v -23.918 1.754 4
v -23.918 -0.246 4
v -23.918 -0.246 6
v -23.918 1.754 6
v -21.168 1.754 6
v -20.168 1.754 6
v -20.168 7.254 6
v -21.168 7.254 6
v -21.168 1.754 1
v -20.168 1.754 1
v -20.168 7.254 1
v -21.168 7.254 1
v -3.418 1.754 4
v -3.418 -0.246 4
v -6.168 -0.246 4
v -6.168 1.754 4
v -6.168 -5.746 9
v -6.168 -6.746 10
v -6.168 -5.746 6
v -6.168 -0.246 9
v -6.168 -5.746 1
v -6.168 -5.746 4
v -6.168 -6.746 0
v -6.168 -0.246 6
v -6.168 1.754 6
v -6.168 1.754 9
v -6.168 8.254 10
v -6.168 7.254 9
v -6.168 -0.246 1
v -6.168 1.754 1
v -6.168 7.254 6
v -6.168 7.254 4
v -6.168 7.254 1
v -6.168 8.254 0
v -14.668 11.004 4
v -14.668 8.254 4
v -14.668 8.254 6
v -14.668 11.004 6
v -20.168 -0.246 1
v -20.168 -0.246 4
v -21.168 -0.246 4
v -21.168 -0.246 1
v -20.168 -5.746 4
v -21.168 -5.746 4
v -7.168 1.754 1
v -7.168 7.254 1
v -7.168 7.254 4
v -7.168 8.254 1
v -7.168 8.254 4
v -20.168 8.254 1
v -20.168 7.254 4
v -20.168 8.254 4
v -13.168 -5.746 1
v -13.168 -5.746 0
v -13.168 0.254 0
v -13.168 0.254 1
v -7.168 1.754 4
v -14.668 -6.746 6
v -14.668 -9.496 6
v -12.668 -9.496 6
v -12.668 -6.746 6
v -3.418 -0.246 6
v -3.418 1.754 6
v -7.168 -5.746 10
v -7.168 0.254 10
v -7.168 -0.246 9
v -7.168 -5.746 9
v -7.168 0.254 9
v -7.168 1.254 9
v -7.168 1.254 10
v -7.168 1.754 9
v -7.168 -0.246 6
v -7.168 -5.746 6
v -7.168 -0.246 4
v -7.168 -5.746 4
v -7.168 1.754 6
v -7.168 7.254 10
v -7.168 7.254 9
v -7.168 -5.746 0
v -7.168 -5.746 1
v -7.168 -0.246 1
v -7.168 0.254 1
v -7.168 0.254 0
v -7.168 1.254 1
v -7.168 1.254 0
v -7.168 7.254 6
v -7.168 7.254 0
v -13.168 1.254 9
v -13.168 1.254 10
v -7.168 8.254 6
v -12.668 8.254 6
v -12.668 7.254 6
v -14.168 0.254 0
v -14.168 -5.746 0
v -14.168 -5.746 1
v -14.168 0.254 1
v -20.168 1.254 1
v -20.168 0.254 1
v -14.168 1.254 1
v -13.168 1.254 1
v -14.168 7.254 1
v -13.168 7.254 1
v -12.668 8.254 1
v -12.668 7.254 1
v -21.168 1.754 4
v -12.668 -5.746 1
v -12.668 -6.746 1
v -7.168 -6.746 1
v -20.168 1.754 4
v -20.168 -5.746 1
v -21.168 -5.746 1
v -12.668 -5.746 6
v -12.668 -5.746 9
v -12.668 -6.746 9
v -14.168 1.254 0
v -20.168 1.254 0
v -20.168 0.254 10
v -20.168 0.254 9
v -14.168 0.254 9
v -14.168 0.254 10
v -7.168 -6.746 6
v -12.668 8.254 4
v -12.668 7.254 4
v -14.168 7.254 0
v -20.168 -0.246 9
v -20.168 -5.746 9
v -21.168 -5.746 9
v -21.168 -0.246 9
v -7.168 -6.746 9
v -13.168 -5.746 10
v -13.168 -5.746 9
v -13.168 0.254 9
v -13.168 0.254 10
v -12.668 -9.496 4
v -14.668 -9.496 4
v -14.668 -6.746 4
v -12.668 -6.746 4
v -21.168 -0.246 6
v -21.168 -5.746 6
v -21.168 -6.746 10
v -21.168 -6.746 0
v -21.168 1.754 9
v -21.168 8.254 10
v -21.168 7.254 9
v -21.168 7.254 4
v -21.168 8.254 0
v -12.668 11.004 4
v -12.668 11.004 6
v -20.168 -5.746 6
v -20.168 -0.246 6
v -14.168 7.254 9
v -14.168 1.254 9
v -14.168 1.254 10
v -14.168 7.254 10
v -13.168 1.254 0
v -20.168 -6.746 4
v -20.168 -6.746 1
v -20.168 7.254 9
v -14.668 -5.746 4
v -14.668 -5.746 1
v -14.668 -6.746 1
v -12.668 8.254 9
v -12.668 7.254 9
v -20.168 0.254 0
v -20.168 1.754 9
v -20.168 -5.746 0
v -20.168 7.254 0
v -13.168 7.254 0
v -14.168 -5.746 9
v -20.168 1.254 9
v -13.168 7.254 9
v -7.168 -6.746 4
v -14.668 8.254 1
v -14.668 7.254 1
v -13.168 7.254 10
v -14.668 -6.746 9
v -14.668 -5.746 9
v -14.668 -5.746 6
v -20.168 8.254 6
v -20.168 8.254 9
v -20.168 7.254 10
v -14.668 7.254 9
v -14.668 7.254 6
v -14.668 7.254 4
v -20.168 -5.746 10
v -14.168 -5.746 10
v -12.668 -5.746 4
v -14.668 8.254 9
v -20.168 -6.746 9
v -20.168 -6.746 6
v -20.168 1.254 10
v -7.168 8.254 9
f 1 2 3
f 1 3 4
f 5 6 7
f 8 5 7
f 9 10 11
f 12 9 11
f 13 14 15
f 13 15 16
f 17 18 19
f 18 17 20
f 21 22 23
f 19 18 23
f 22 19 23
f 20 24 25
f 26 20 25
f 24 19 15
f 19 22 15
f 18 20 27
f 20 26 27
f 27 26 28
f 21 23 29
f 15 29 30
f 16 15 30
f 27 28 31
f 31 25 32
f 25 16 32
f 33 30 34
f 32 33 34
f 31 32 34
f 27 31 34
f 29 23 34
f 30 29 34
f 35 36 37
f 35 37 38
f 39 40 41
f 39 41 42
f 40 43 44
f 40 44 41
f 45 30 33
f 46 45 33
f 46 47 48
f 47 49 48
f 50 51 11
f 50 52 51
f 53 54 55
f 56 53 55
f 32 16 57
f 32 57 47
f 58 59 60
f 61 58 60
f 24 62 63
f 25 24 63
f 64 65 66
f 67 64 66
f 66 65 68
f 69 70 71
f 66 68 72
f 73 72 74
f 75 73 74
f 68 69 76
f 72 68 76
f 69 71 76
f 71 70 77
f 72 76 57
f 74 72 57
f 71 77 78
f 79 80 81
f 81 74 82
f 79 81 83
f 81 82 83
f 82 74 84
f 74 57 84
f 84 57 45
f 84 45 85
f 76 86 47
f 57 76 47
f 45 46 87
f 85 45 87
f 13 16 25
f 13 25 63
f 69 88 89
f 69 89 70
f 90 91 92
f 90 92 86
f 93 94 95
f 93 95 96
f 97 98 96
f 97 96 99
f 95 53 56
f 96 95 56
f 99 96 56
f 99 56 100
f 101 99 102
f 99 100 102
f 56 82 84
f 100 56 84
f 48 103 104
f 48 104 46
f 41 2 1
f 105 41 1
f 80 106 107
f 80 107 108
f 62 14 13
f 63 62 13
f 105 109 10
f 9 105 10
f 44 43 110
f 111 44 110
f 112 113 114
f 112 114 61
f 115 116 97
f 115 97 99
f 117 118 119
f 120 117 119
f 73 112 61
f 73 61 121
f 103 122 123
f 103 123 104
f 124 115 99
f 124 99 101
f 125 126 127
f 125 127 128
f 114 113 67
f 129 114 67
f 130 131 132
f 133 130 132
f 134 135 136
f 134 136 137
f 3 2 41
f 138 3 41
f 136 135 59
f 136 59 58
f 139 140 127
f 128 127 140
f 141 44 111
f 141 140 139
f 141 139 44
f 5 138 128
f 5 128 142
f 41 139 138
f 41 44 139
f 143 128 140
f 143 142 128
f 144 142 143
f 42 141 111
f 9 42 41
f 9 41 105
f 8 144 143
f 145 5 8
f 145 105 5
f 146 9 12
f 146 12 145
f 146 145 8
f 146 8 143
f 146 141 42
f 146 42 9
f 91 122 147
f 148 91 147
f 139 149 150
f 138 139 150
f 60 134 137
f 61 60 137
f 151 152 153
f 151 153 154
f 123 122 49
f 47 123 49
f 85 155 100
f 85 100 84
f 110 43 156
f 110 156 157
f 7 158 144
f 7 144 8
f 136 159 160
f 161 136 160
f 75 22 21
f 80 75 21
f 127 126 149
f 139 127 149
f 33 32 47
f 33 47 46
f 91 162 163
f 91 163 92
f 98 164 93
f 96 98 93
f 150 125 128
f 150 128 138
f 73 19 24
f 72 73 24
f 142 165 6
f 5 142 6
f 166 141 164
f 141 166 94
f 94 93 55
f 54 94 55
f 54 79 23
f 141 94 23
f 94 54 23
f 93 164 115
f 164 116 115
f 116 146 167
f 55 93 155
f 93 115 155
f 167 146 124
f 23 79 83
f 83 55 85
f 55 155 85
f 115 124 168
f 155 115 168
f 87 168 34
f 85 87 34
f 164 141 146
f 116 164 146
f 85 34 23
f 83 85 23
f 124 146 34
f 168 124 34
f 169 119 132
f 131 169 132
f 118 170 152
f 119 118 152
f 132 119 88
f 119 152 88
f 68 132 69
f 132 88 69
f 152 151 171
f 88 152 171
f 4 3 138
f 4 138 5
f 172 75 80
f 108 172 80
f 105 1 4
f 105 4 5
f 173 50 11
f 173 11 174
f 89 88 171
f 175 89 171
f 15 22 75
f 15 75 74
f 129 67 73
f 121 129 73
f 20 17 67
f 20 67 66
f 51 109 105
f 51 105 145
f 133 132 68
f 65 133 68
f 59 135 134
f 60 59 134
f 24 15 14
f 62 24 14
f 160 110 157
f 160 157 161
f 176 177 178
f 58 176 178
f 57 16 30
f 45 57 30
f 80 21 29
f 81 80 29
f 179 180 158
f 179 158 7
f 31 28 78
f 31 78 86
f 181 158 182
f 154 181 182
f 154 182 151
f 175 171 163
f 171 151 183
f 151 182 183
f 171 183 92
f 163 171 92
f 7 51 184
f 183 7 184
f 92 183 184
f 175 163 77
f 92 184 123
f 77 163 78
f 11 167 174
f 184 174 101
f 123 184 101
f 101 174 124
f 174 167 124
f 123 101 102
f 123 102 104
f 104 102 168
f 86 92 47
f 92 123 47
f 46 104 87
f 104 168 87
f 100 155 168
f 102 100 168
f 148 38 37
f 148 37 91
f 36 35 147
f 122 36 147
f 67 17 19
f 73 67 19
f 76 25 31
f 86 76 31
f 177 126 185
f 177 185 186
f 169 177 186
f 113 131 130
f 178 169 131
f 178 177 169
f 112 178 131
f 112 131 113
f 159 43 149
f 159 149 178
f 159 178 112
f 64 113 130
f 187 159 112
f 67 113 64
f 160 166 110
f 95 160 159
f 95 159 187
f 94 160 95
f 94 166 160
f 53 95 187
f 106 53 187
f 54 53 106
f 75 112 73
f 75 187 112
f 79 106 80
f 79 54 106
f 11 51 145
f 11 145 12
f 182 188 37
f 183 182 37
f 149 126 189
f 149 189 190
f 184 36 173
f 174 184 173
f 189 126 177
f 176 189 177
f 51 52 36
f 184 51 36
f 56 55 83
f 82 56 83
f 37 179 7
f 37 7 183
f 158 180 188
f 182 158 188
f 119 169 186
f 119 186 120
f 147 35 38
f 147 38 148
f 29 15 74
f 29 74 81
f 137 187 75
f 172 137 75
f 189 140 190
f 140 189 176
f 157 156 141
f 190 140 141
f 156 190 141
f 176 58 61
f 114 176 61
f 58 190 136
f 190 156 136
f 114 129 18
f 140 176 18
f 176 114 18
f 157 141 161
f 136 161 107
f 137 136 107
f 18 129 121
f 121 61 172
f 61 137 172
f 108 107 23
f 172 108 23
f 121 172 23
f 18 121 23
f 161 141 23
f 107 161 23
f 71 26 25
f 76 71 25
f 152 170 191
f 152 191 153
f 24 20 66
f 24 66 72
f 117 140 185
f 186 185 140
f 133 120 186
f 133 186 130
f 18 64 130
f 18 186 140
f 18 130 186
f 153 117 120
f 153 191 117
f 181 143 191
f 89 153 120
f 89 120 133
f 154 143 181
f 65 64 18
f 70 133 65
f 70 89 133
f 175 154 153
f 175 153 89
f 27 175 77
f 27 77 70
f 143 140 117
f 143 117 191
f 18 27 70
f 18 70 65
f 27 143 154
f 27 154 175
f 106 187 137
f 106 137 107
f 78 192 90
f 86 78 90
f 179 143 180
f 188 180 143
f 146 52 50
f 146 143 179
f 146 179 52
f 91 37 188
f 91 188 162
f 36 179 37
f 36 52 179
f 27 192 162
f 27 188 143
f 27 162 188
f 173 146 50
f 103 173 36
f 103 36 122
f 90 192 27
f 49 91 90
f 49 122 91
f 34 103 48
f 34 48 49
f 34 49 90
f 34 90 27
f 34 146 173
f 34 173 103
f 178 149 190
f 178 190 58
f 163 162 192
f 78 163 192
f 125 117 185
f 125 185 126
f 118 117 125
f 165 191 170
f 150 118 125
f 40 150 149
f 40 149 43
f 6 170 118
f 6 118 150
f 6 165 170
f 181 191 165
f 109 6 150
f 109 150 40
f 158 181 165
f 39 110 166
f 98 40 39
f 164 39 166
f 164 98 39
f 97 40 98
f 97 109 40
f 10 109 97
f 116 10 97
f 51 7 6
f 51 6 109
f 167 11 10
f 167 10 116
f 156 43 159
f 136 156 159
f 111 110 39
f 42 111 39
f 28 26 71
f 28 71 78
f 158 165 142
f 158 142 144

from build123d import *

# Parameters (mm, degrees)
SKETCH_1_W               = 15
SKETCH_1_H               = 15
SKETCH_1_W_2             = 6
SKETCH_1_H_2             = 6
SKETCH_1_W_3             = 2
SKETCH_1_H_3             = 2.75
SKETCH_1_W_4             = 2.75
SKETCH_1_H_4             = 2
EXTRUDE_1_DEPTH          = 10
SKETCH_2_W               = 2
SKETCH_2_H               = 4
CUT_EXTRUDE_1_DEPTH      = 2.75
SKETCH_3_W               = 4
SKETCH_3_H               = 2
CUT_EXTRUDE_2_DEPTH      = 2.75
SKETCH_4_W               = 2
SKETCH_4_H               = 4
CUT_EXTRUDE_3_DEPTH      = 2.75
SKETCH_5_W               = 4
SKETCH_5_H               = 2
CUT_EXTRUDE_4_DEPTH      = 2.75
SKETCH_6_W               = 5.5
SKETCH_6_H               = 3
CUT_EXTRUDE_5_DEPTH      = 18.75
SKETCH_7_W               = 3
SKETCH_7_H               = 5.5
CUT_EXTRUDE_6_DEPTH      = 18.75
SKETCH_8_W               = 8
SKETCH_8_H               = 13
CUT_EXTRUDE_7_DEPTH      = 6
CUT_EXTRUDE_7_DEPTH_BACK = 0.75
SKETCH_9_W               = 8
SKETCH_9_H               = 13
CUT_EXTRUDE_8_DEPTH      = 6
SKETCH_10_W              = 8
SKETCH_10_H              = 13
CUT_EXTRUDE_9_DEPTH      = 6


with BuildPart() as part:
    # ｽｹｯﾁ1 → ﾎﾞｽ - 押し出し1 (new body)
    with BuildSketch(Plane.XY):
        with Locations((-13.66786655, 0.754091784)):
            Rectangle(SKETCH_1_W, SKETCH_1_H)
        with Locations((-17.16786655, -2.745908216)):
            Rectangle(SKETCH_1_W_2, SKETCH_1_H_2, mode=Mode.SUBTRACT)
        with Locations((-10.16786655, -2.745908216)):
            Rectangle(SKETCH_1_W_2, SKETCH_1_H_2, mode=Mode.SUBTRACT)
        with Locations((-10.16786655, 4.254091784)):
            Rectangle(SKETCH_1_W_2, SKETCH_1_H_2, mode=Mode.SUBTRACT)
        with Locations((-17.16786655, 4.254091784)):
            Rectangle(SKETCH_1_W_2, SKETCH_1_H_2, mode=Mode.SUBTRACT)
        with Locations((-13.66786655, 9.629091784)):
            Rectangle(SKETCH_1_W_3, SKETCH_1_H_3)
        with Locations((-22.54286655, 0.754091784)):
            Rectangle(SKETCH_1_W_4, SKETCH_1_H_4)
        with Locations((-4.79286655, 0.754091784)):
            Rectangle(SKETCH_1_W_4, SKETCH_1_H_4)
        with Locations((-13.66786655, -8.120908216)):
            Rectangle(SKETCH_1_W_3, SKETCH_1_H_3)
    extrude(amount=EXTRUDE_1_DEPTH)

    # ｽｹｯﾁ2 → ｶｯﾄ - 押し出し1 (cut)
    with BuildSketch(Plane(origin=(0, 11.004091784, 0), x_dir=(1, 0, 0), z_dir=(0, 1, 0))):
        with Locations((-13.66786655, -2)):
            Rectangle(SKETCH_2_W, SKETCH_2_H)
        with Locations((-13.66786655, -8)):
            Rectangle(SKETCH_2_W, SKETCH_2_H)
    extrude(amount=-CUT_EXTRUDE_1_DEPTH, mode=Mode.SUBTRACT)

    # ｽｹｯﾁ3 → ｶｯﾄ - 押し出し2 (cut)
    with BuildSketch(Plane(origin=(-3.41786655, 0, 0), x_dir=(0, 0, -1), z_dir=(1, 0, 0))):
        with Locations((-8, 0.754091784)):
            Rectangle(SKETCH_3_W, SKETCH_3_H)
        with Locations((-2, 0.754091784)):
            Rectangle(SKETCH_3_W, SKETCH_3_H)
    extrude(amount=-CUT_EXTRUDE_2_DEPTH, mode=Mode.SUBTRACT)

    # ｽｹｯﾁ4 → ｶｯﾄ - 押し出し3 (cut)
    with BuildSketch(Plane.XZ.offset(9.495908216)):
        with Locations((-13.66786655, 8)):
            Rectangle(SKETCH_4_W, SKETCH_4_H)
        with Locations((-13.66786655, 2)):
            Rectangle(SKETCH_4_W, SKETCH_4_H)
    extrude(amount=-CUT_EXTRUDE_3_DEPTH, mode=Mode.SUBTRACT)

    # ｽｹｯﾁ5 → ｶｯﾄ - 押し出し4 (cut)
    with BuildSketch(Plane.ZY.offset(23.91786655)):
        with Locations((2, 0.754091784)):
            Rectangle(SKETCH_5_W, SKETCH_5_H)
        with Locations((8, 0.754091784)):
            Rectangle(SKETCH_5_W, SKETCH_5_H)
    extrude(amount=-CUT_EXTRUDE_4_DEPTH, mode=Mode.SUBTRACT)

    # ｽｹｯﾁ6 → ｶｯﾄ - 押し出し5 (cut, through all)
    with BuildSketch(Plane(origin=(0, 8.254091784, 0), x_dir=(1, 0, 0), z_dir=(0, 1, 0))):
        with Locations((-17.41786655, -2.5)):
            Rectangle(SKETCH_6_W, SKETCH_6_H)
        with Locations((-9.91786655, -2.5)):
            Rectangle(SKETCH_6_W, SKETCH_6_H)
        with Locations((-17.41786655, -7.5)):
            Rectangle(SKETCH_6_W, SKETCH_6_H)
        with Locations((-9.91786655, -7.5)):
            Rectangle(SKETCH_6_W, SKETCH_6_H)
    extrude(amount=-CUT_EXTRUDE_5_DEPTH, mode=Mode.SUBTRACT)

    # ｽｹｯﾁ7 → ｶｯﾄ - 押し出し6 (cut, through all)
    with BuildSketch(Plane(origin=(-6.16786655, 0, 0), x_dir=(0, 0, -1), z_dir=(1, 0, 0))):
        with Locations((-7.5, 4.504091784)):
            Rectangle(SKETCH_7_W, SKETCH_7_H)
        with Locations((-2.5, 4.504091784)):
            Rectangle(SKETCH_7_W, SKETCH_7_H)
        with Locations((-7.5, -2.995908216)):
            Rectangle(SKETCH_7_W, SKETCH_7_H)
        with Locations((-2.5, -2.995908216)):
            Rectangle(SKETCH_7_W, SKETCH_7_H)
    extrude(amount=-CUT_EXTRUDE_6_DEPTH, mode=Mode.SUBTRACT)

    # ｽｹｯﾁ8 → ｶｯﾄ - 押し出し7 (cut, two sides)
    with BuildSketch(Plane.ZY.offset(14.16786655)) as cut_extrude_7_sk:
        with Locations((5, 0.754091784)):
            Rectangle(SKETCH_8_W, SKETCH_8_H)
    extrude(amount=CUT_EXTRUDE_7_DEPTH, mode=Mode.SUBTRACT)
    extrude(cut_extrude_7_sk.sketch, amount=-CUT_EXTRUDE_7_DEPTH_BACK, mode=Mode.SUBTRACT)

    # ｽｹｯﾁ9 → ｶｯﾄ - 押し出し8 (cut)
    with BuildSketch(Plane(origin=(-13.16786655, 0, 0), x_dir=(0, 0, -1), z_dir=(1, 0, 0))):
        with Locations((-5, 0.754091784)):
            Rectangle(SKETCH_9_W, SKETCH_9_H)
    extrude(amount=CUT_EXTRUDE_8_DEPTH, mode=Mode.SUBTRACT)

    # ｽｹｯﾁ10 → ｶｯﾄ - 押し出し9 (cut)
    with BuildSketch(Plane(origin=(-13.16786655, 0, 0), x_dir=(0, 0, -1), z_dir=(1, 0, 0))):
        with Locations((-5, 0.754091784)):
            Rectangle(SKETCH_10_W, SKETCH_10_H)
    extrude(amount=-CUT_EXTRUDE_9_DEPTH, mode=Mode.SUBTRACT)


solid = part.part
